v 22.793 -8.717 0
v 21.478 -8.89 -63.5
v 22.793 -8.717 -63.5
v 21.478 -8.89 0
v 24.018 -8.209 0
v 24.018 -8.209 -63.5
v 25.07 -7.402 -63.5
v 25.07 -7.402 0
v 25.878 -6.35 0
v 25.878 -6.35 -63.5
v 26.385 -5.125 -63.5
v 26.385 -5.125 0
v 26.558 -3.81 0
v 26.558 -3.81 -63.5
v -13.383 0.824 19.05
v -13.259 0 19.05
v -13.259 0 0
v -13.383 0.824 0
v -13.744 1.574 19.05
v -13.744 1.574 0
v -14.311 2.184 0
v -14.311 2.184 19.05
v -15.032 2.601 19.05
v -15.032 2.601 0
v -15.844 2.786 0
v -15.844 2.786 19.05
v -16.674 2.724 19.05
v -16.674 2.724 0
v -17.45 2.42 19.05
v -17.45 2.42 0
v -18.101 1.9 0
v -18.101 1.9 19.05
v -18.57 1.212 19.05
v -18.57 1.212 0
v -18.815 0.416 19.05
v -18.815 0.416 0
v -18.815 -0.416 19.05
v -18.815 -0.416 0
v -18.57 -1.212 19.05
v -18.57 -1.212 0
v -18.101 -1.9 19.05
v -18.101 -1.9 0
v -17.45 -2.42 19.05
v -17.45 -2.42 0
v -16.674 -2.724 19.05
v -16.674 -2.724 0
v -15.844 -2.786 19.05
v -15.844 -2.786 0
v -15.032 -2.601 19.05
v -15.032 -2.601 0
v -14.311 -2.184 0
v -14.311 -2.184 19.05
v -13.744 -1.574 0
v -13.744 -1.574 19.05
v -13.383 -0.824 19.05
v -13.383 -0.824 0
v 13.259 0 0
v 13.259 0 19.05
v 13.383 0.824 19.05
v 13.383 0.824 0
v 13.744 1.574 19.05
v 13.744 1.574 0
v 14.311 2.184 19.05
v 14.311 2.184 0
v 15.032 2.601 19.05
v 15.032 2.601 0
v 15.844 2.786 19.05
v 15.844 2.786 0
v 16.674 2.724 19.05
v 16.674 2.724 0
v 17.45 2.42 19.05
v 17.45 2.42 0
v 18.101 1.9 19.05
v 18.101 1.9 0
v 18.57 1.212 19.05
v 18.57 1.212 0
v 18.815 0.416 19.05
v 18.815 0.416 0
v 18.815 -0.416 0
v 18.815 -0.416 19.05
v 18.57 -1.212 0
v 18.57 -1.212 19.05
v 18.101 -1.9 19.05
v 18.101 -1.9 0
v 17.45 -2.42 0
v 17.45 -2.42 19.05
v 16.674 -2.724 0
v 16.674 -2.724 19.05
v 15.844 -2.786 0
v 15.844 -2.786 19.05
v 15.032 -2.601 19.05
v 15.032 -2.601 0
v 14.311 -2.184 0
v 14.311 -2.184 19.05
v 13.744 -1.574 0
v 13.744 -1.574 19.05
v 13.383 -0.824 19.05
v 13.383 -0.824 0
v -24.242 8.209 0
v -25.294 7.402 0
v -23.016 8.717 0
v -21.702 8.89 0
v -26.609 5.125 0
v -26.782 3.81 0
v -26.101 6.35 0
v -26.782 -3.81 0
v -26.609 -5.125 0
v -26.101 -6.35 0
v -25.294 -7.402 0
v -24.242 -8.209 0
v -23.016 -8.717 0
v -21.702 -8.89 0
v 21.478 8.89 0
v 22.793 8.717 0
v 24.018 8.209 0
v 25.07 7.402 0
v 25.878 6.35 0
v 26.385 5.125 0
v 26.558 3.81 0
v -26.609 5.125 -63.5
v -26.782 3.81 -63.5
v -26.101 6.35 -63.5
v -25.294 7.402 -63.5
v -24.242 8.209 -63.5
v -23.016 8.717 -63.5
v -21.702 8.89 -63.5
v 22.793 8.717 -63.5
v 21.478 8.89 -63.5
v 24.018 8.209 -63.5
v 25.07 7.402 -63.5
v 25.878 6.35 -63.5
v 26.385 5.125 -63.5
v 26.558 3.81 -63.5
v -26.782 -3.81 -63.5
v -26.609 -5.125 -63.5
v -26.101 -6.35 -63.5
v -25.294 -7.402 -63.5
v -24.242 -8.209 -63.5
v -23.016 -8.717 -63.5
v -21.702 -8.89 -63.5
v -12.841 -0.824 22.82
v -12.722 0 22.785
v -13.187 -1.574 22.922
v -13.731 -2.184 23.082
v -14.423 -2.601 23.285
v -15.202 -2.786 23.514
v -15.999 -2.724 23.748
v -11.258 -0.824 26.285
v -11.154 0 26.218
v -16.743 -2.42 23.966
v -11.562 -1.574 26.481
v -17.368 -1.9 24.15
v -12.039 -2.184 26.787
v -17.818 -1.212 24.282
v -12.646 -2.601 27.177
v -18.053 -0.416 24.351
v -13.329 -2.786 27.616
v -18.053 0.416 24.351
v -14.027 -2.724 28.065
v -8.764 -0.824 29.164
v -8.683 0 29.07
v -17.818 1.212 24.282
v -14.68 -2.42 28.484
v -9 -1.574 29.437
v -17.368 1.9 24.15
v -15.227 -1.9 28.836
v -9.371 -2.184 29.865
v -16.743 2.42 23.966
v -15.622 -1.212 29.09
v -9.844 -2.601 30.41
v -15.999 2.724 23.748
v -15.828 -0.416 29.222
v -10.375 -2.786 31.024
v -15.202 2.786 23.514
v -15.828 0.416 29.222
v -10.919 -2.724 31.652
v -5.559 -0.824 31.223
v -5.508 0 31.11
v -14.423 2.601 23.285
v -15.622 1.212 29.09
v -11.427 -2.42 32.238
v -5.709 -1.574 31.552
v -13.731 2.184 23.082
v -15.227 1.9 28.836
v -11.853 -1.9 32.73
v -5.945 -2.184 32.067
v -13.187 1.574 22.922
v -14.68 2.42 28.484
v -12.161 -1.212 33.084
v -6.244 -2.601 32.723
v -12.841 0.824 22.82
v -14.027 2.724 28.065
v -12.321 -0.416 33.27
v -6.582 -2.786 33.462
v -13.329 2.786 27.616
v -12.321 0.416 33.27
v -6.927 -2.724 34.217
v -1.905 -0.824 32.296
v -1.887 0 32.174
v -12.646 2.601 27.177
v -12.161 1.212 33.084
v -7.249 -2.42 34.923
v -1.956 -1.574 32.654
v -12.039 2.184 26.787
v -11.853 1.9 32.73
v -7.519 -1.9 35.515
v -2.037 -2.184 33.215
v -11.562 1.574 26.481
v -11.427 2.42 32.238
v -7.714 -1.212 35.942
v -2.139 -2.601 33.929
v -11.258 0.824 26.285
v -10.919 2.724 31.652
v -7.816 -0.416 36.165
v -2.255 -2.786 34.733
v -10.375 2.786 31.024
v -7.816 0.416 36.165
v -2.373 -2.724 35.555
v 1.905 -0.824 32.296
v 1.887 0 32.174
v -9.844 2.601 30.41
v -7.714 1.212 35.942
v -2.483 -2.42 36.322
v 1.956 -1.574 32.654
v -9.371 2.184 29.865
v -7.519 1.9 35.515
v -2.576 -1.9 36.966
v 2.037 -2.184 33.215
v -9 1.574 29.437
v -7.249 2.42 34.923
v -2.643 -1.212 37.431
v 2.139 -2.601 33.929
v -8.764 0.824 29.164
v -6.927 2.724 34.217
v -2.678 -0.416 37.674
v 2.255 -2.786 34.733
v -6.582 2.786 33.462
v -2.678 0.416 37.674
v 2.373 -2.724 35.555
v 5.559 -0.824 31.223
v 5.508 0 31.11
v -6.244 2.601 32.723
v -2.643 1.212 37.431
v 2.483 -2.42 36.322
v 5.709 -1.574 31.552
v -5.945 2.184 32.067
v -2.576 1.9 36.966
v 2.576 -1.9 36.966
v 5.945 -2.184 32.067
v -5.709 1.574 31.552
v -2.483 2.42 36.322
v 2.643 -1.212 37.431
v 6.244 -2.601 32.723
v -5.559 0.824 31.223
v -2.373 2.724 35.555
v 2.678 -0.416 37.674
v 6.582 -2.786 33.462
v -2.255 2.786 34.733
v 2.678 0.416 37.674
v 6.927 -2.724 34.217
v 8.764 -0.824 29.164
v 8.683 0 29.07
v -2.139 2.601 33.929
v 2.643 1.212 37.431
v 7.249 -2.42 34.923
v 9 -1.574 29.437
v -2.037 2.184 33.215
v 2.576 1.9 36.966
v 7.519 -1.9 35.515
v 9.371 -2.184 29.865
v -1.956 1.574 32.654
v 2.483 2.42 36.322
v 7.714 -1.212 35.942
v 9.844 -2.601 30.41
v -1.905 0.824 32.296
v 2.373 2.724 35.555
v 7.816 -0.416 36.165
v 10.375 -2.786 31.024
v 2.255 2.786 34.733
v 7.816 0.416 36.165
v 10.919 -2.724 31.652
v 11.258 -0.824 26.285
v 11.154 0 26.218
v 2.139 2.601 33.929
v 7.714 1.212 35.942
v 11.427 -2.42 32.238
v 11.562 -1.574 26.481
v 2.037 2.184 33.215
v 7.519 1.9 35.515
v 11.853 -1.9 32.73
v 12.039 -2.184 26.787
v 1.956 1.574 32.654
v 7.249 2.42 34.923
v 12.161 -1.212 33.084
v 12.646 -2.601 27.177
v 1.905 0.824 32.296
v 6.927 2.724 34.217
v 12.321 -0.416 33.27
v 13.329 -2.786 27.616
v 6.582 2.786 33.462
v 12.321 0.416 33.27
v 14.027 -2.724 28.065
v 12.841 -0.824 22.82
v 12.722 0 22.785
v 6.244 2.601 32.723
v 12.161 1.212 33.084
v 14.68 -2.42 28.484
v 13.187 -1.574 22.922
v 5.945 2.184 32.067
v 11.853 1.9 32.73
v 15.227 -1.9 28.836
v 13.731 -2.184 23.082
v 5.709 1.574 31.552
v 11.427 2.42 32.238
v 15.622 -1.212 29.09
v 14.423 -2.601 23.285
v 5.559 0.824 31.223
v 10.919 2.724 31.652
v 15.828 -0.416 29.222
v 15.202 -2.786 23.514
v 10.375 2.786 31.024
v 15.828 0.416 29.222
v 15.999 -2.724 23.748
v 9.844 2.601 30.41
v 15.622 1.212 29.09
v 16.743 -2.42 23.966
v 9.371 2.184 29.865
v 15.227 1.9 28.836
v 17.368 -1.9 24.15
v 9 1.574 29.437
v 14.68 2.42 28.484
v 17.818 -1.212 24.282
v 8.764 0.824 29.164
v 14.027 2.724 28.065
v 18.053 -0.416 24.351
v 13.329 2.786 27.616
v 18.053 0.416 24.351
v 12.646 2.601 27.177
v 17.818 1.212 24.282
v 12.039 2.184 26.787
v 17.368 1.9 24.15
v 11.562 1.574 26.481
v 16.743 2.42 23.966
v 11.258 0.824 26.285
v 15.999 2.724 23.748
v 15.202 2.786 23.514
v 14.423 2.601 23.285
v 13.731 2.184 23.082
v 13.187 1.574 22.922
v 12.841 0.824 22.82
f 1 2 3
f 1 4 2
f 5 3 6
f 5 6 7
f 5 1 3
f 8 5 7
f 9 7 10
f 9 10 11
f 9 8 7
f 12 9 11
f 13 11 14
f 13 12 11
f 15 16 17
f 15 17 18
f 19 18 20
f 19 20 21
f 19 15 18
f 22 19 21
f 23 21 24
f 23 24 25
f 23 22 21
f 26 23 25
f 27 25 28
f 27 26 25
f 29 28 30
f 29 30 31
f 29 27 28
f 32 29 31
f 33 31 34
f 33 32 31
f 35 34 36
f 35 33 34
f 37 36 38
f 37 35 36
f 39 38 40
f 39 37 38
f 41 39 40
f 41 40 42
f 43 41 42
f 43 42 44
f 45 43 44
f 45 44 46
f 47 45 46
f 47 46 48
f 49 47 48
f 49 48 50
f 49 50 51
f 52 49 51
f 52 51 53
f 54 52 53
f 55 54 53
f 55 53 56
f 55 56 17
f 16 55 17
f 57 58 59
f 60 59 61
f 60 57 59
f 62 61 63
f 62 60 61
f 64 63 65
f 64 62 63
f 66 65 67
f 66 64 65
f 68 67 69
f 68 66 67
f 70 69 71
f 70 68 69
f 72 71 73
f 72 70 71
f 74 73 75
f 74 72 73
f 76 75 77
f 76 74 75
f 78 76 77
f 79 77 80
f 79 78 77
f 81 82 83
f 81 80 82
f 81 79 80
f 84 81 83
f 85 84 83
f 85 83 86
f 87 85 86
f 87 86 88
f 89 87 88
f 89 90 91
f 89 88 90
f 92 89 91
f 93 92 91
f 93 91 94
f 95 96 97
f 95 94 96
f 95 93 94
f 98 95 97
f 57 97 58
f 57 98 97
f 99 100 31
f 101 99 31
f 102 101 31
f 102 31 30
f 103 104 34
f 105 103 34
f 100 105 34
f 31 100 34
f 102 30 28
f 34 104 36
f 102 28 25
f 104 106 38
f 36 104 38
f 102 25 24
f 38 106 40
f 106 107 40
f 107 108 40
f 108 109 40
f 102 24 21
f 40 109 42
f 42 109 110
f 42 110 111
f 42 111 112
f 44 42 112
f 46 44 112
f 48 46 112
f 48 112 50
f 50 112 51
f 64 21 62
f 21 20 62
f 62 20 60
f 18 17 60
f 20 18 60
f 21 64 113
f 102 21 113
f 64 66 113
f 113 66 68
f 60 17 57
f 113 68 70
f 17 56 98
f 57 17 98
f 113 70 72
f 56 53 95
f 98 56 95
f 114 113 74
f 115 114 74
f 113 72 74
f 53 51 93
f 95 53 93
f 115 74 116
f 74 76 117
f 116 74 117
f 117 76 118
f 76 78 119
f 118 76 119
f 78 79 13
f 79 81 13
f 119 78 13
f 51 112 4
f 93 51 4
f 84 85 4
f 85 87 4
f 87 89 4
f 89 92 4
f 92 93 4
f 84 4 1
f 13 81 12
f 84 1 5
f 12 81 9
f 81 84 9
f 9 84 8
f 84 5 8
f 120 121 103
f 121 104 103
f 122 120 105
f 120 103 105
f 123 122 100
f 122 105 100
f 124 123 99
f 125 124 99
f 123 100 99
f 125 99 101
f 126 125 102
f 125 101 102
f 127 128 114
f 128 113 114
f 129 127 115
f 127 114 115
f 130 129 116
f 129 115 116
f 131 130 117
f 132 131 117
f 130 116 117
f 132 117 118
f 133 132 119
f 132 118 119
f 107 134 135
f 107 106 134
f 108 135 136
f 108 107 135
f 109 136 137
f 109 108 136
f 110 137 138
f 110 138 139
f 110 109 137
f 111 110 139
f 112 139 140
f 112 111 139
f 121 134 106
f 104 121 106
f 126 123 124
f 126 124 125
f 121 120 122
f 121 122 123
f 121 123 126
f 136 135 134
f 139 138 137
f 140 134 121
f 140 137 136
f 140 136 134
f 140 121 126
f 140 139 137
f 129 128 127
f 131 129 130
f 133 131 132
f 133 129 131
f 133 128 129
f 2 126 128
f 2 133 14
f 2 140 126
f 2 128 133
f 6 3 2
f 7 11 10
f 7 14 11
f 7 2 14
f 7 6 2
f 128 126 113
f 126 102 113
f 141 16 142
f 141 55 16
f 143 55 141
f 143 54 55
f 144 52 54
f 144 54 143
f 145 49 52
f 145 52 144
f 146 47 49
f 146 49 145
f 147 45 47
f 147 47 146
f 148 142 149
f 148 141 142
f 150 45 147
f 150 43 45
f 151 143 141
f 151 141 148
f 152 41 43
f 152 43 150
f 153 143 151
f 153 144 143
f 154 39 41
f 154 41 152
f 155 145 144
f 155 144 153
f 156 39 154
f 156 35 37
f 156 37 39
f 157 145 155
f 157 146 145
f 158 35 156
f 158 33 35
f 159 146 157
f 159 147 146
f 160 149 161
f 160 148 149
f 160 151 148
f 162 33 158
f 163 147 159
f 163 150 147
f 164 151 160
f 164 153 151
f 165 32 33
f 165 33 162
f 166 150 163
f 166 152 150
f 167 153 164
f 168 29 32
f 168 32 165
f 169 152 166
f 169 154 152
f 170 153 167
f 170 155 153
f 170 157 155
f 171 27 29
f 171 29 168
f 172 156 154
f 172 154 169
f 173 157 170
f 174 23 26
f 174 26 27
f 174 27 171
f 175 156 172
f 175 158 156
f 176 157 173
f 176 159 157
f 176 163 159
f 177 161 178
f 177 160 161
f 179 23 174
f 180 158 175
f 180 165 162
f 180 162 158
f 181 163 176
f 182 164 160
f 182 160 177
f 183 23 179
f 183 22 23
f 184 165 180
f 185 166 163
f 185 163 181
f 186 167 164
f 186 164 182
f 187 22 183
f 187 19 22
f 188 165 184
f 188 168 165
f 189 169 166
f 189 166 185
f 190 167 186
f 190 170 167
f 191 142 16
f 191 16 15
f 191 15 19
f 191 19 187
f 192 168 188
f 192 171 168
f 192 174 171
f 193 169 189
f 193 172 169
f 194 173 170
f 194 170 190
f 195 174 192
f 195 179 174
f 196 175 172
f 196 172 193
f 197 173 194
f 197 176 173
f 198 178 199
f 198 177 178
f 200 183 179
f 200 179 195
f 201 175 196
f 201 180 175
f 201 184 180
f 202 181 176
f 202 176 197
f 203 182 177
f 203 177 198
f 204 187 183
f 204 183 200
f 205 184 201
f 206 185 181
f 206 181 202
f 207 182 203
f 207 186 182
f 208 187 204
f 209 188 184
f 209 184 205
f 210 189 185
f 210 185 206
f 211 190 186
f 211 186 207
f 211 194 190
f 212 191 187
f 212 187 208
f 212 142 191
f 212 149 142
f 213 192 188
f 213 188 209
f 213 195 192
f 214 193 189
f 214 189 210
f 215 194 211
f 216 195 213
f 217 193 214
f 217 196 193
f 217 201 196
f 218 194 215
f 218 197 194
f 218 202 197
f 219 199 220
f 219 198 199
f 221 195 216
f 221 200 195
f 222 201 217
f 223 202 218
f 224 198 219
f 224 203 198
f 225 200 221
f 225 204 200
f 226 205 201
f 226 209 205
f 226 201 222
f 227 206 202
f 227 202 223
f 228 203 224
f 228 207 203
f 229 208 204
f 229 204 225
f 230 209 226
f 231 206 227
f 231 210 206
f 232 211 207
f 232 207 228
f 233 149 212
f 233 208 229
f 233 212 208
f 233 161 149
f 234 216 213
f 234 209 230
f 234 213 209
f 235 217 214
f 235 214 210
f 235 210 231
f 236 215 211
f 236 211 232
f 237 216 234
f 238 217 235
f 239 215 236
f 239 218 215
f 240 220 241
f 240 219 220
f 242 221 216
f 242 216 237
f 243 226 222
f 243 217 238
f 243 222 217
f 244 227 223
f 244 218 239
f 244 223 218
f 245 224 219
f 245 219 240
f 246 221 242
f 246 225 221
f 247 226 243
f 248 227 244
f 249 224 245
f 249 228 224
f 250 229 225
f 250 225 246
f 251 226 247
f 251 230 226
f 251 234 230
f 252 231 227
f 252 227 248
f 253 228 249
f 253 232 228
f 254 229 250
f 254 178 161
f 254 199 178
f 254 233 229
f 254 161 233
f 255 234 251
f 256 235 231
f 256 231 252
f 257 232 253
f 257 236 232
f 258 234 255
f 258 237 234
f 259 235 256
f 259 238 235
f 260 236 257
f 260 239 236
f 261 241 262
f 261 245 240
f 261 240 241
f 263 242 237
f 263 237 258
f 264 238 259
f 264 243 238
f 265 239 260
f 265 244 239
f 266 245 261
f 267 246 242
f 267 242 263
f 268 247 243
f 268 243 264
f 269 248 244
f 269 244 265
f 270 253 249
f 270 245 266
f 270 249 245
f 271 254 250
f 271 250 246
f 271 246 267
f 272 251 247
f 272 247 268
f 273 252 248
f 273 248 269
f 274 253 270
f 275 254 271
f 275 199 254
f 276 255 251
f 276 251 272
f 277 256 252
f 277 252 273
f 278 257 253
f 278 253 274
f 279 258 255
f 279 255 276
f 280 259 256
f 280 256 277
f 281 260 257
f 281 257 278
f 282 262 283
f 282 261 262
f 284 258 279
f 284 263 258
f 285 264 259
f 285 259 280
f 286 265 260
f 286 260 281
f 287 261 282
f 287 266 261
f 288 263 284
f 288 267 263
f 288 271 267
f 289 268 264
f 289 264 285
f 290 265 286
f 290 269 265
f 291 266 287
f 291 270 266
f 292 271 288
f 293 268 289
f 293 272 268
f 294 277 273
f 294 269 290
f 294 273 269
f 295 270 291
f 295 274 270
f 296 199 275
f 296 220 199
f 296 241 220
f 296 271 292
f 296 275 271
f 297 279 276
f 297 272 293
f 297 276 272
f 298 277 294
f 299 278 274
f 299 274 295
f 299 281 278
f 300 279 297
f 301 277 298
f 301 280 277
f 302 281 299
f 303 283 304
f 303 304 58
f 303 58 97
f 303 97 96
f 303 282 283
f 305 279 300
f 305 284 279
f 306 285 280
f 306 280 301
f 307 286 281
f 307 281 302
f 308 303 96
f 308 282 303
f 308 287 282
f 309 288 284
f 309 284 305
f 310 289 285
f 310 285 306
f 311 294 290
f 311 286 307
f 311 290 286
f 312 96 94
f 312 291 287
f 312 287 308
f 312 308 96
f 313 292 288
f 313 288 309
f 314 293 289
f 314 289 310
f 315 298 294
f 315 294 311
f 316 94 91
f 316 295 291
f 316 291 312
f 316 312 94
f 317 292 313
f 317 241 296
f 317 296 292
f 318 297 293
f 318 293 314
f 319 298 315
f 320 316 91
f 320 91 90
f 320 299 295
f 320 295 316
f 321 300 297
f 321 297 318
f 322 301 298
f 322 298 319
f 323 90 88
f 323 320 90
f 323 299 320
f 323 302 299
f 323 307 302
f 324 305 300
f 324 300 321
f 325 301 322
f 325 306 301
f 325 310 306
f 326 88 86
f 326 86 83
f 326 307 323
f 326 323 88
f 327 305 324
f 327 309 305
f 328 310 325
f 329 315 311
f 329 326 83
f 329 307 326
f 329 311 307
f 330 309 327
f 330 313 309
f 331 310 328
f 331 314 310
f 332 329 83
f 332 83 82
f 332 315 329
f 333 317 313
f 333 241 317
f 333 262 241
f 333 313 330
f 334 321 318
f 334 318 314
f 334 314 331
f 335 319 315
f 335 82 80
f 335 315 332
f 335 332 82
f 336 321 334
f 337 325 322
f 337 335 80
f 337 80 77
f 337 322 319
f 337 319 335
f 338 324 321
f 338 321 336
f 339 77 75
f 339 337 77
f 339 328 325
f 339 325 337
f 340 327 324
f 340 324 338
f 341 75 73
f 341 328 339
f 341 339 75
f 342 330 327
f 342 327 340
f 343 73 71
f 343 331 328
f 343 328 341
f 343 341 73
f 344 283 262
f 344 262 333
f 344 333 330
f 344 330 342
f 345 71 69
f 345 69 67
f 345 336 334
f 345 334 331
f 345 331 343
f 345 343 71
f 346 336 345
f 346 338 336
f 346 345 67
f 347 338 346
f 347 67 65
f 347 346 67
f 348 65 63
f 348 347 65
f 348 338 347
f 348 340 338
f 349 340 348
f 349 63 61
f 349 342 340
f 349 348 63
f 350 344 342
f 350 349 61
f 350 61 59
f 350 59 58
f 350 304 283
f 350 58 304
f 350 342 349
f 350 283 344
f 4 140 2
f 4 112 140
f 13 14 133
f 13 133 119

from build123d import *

# Parameters (mm, degrees)
F1_R     = 2.794
F3_W     = 53.34
F3_H     = 63.5
F4_DEPTH = 8.89
F5_R     = 5.08


with BuildPart() as f2:
    # F2: sweep along a path in F0
    with BuildLine(Plane.XZ) as f2_path:
        Line((-16.0525806478, 0), (-16.0525806478, 19.05))
        ThreePointArc((-16.0525806478, 19.05), (0, 35.1025806478), (16.0525806478, 19.05))
        Line((16.0525806478, 19.05), (16.0525806478, 0))
    # F1 (on Top) → F2 (sweep)
    with BuildSketch(Plane.XY):
        with Locations((-16.0525806478, 0)):
            Circle(F1_R)
    sweep(path=f2_path.line)

    # F3 (on Front) → F4 (join, symmetric)
    with BuildSketch(Plane.XZ):
        with Locations((-0.1116646679, -31.75)):
            Rectangle(F3_W, F3_H)
    extrude(amount=F4_DEPTH, both=True)

    # F5
    f5_edges = [f2.edges().sort_by_distance(p)[0] for p in [
        (-26.781665, -8.89, -31.75),
        (-26.781665, 8.89, -31.75),
        (26.558335, 8.89, -31.75),
        (26.558335, -8.89, -31.75),
    ]]
    fillet(f5_edges, radius=F5_R)


solid = f2.part
